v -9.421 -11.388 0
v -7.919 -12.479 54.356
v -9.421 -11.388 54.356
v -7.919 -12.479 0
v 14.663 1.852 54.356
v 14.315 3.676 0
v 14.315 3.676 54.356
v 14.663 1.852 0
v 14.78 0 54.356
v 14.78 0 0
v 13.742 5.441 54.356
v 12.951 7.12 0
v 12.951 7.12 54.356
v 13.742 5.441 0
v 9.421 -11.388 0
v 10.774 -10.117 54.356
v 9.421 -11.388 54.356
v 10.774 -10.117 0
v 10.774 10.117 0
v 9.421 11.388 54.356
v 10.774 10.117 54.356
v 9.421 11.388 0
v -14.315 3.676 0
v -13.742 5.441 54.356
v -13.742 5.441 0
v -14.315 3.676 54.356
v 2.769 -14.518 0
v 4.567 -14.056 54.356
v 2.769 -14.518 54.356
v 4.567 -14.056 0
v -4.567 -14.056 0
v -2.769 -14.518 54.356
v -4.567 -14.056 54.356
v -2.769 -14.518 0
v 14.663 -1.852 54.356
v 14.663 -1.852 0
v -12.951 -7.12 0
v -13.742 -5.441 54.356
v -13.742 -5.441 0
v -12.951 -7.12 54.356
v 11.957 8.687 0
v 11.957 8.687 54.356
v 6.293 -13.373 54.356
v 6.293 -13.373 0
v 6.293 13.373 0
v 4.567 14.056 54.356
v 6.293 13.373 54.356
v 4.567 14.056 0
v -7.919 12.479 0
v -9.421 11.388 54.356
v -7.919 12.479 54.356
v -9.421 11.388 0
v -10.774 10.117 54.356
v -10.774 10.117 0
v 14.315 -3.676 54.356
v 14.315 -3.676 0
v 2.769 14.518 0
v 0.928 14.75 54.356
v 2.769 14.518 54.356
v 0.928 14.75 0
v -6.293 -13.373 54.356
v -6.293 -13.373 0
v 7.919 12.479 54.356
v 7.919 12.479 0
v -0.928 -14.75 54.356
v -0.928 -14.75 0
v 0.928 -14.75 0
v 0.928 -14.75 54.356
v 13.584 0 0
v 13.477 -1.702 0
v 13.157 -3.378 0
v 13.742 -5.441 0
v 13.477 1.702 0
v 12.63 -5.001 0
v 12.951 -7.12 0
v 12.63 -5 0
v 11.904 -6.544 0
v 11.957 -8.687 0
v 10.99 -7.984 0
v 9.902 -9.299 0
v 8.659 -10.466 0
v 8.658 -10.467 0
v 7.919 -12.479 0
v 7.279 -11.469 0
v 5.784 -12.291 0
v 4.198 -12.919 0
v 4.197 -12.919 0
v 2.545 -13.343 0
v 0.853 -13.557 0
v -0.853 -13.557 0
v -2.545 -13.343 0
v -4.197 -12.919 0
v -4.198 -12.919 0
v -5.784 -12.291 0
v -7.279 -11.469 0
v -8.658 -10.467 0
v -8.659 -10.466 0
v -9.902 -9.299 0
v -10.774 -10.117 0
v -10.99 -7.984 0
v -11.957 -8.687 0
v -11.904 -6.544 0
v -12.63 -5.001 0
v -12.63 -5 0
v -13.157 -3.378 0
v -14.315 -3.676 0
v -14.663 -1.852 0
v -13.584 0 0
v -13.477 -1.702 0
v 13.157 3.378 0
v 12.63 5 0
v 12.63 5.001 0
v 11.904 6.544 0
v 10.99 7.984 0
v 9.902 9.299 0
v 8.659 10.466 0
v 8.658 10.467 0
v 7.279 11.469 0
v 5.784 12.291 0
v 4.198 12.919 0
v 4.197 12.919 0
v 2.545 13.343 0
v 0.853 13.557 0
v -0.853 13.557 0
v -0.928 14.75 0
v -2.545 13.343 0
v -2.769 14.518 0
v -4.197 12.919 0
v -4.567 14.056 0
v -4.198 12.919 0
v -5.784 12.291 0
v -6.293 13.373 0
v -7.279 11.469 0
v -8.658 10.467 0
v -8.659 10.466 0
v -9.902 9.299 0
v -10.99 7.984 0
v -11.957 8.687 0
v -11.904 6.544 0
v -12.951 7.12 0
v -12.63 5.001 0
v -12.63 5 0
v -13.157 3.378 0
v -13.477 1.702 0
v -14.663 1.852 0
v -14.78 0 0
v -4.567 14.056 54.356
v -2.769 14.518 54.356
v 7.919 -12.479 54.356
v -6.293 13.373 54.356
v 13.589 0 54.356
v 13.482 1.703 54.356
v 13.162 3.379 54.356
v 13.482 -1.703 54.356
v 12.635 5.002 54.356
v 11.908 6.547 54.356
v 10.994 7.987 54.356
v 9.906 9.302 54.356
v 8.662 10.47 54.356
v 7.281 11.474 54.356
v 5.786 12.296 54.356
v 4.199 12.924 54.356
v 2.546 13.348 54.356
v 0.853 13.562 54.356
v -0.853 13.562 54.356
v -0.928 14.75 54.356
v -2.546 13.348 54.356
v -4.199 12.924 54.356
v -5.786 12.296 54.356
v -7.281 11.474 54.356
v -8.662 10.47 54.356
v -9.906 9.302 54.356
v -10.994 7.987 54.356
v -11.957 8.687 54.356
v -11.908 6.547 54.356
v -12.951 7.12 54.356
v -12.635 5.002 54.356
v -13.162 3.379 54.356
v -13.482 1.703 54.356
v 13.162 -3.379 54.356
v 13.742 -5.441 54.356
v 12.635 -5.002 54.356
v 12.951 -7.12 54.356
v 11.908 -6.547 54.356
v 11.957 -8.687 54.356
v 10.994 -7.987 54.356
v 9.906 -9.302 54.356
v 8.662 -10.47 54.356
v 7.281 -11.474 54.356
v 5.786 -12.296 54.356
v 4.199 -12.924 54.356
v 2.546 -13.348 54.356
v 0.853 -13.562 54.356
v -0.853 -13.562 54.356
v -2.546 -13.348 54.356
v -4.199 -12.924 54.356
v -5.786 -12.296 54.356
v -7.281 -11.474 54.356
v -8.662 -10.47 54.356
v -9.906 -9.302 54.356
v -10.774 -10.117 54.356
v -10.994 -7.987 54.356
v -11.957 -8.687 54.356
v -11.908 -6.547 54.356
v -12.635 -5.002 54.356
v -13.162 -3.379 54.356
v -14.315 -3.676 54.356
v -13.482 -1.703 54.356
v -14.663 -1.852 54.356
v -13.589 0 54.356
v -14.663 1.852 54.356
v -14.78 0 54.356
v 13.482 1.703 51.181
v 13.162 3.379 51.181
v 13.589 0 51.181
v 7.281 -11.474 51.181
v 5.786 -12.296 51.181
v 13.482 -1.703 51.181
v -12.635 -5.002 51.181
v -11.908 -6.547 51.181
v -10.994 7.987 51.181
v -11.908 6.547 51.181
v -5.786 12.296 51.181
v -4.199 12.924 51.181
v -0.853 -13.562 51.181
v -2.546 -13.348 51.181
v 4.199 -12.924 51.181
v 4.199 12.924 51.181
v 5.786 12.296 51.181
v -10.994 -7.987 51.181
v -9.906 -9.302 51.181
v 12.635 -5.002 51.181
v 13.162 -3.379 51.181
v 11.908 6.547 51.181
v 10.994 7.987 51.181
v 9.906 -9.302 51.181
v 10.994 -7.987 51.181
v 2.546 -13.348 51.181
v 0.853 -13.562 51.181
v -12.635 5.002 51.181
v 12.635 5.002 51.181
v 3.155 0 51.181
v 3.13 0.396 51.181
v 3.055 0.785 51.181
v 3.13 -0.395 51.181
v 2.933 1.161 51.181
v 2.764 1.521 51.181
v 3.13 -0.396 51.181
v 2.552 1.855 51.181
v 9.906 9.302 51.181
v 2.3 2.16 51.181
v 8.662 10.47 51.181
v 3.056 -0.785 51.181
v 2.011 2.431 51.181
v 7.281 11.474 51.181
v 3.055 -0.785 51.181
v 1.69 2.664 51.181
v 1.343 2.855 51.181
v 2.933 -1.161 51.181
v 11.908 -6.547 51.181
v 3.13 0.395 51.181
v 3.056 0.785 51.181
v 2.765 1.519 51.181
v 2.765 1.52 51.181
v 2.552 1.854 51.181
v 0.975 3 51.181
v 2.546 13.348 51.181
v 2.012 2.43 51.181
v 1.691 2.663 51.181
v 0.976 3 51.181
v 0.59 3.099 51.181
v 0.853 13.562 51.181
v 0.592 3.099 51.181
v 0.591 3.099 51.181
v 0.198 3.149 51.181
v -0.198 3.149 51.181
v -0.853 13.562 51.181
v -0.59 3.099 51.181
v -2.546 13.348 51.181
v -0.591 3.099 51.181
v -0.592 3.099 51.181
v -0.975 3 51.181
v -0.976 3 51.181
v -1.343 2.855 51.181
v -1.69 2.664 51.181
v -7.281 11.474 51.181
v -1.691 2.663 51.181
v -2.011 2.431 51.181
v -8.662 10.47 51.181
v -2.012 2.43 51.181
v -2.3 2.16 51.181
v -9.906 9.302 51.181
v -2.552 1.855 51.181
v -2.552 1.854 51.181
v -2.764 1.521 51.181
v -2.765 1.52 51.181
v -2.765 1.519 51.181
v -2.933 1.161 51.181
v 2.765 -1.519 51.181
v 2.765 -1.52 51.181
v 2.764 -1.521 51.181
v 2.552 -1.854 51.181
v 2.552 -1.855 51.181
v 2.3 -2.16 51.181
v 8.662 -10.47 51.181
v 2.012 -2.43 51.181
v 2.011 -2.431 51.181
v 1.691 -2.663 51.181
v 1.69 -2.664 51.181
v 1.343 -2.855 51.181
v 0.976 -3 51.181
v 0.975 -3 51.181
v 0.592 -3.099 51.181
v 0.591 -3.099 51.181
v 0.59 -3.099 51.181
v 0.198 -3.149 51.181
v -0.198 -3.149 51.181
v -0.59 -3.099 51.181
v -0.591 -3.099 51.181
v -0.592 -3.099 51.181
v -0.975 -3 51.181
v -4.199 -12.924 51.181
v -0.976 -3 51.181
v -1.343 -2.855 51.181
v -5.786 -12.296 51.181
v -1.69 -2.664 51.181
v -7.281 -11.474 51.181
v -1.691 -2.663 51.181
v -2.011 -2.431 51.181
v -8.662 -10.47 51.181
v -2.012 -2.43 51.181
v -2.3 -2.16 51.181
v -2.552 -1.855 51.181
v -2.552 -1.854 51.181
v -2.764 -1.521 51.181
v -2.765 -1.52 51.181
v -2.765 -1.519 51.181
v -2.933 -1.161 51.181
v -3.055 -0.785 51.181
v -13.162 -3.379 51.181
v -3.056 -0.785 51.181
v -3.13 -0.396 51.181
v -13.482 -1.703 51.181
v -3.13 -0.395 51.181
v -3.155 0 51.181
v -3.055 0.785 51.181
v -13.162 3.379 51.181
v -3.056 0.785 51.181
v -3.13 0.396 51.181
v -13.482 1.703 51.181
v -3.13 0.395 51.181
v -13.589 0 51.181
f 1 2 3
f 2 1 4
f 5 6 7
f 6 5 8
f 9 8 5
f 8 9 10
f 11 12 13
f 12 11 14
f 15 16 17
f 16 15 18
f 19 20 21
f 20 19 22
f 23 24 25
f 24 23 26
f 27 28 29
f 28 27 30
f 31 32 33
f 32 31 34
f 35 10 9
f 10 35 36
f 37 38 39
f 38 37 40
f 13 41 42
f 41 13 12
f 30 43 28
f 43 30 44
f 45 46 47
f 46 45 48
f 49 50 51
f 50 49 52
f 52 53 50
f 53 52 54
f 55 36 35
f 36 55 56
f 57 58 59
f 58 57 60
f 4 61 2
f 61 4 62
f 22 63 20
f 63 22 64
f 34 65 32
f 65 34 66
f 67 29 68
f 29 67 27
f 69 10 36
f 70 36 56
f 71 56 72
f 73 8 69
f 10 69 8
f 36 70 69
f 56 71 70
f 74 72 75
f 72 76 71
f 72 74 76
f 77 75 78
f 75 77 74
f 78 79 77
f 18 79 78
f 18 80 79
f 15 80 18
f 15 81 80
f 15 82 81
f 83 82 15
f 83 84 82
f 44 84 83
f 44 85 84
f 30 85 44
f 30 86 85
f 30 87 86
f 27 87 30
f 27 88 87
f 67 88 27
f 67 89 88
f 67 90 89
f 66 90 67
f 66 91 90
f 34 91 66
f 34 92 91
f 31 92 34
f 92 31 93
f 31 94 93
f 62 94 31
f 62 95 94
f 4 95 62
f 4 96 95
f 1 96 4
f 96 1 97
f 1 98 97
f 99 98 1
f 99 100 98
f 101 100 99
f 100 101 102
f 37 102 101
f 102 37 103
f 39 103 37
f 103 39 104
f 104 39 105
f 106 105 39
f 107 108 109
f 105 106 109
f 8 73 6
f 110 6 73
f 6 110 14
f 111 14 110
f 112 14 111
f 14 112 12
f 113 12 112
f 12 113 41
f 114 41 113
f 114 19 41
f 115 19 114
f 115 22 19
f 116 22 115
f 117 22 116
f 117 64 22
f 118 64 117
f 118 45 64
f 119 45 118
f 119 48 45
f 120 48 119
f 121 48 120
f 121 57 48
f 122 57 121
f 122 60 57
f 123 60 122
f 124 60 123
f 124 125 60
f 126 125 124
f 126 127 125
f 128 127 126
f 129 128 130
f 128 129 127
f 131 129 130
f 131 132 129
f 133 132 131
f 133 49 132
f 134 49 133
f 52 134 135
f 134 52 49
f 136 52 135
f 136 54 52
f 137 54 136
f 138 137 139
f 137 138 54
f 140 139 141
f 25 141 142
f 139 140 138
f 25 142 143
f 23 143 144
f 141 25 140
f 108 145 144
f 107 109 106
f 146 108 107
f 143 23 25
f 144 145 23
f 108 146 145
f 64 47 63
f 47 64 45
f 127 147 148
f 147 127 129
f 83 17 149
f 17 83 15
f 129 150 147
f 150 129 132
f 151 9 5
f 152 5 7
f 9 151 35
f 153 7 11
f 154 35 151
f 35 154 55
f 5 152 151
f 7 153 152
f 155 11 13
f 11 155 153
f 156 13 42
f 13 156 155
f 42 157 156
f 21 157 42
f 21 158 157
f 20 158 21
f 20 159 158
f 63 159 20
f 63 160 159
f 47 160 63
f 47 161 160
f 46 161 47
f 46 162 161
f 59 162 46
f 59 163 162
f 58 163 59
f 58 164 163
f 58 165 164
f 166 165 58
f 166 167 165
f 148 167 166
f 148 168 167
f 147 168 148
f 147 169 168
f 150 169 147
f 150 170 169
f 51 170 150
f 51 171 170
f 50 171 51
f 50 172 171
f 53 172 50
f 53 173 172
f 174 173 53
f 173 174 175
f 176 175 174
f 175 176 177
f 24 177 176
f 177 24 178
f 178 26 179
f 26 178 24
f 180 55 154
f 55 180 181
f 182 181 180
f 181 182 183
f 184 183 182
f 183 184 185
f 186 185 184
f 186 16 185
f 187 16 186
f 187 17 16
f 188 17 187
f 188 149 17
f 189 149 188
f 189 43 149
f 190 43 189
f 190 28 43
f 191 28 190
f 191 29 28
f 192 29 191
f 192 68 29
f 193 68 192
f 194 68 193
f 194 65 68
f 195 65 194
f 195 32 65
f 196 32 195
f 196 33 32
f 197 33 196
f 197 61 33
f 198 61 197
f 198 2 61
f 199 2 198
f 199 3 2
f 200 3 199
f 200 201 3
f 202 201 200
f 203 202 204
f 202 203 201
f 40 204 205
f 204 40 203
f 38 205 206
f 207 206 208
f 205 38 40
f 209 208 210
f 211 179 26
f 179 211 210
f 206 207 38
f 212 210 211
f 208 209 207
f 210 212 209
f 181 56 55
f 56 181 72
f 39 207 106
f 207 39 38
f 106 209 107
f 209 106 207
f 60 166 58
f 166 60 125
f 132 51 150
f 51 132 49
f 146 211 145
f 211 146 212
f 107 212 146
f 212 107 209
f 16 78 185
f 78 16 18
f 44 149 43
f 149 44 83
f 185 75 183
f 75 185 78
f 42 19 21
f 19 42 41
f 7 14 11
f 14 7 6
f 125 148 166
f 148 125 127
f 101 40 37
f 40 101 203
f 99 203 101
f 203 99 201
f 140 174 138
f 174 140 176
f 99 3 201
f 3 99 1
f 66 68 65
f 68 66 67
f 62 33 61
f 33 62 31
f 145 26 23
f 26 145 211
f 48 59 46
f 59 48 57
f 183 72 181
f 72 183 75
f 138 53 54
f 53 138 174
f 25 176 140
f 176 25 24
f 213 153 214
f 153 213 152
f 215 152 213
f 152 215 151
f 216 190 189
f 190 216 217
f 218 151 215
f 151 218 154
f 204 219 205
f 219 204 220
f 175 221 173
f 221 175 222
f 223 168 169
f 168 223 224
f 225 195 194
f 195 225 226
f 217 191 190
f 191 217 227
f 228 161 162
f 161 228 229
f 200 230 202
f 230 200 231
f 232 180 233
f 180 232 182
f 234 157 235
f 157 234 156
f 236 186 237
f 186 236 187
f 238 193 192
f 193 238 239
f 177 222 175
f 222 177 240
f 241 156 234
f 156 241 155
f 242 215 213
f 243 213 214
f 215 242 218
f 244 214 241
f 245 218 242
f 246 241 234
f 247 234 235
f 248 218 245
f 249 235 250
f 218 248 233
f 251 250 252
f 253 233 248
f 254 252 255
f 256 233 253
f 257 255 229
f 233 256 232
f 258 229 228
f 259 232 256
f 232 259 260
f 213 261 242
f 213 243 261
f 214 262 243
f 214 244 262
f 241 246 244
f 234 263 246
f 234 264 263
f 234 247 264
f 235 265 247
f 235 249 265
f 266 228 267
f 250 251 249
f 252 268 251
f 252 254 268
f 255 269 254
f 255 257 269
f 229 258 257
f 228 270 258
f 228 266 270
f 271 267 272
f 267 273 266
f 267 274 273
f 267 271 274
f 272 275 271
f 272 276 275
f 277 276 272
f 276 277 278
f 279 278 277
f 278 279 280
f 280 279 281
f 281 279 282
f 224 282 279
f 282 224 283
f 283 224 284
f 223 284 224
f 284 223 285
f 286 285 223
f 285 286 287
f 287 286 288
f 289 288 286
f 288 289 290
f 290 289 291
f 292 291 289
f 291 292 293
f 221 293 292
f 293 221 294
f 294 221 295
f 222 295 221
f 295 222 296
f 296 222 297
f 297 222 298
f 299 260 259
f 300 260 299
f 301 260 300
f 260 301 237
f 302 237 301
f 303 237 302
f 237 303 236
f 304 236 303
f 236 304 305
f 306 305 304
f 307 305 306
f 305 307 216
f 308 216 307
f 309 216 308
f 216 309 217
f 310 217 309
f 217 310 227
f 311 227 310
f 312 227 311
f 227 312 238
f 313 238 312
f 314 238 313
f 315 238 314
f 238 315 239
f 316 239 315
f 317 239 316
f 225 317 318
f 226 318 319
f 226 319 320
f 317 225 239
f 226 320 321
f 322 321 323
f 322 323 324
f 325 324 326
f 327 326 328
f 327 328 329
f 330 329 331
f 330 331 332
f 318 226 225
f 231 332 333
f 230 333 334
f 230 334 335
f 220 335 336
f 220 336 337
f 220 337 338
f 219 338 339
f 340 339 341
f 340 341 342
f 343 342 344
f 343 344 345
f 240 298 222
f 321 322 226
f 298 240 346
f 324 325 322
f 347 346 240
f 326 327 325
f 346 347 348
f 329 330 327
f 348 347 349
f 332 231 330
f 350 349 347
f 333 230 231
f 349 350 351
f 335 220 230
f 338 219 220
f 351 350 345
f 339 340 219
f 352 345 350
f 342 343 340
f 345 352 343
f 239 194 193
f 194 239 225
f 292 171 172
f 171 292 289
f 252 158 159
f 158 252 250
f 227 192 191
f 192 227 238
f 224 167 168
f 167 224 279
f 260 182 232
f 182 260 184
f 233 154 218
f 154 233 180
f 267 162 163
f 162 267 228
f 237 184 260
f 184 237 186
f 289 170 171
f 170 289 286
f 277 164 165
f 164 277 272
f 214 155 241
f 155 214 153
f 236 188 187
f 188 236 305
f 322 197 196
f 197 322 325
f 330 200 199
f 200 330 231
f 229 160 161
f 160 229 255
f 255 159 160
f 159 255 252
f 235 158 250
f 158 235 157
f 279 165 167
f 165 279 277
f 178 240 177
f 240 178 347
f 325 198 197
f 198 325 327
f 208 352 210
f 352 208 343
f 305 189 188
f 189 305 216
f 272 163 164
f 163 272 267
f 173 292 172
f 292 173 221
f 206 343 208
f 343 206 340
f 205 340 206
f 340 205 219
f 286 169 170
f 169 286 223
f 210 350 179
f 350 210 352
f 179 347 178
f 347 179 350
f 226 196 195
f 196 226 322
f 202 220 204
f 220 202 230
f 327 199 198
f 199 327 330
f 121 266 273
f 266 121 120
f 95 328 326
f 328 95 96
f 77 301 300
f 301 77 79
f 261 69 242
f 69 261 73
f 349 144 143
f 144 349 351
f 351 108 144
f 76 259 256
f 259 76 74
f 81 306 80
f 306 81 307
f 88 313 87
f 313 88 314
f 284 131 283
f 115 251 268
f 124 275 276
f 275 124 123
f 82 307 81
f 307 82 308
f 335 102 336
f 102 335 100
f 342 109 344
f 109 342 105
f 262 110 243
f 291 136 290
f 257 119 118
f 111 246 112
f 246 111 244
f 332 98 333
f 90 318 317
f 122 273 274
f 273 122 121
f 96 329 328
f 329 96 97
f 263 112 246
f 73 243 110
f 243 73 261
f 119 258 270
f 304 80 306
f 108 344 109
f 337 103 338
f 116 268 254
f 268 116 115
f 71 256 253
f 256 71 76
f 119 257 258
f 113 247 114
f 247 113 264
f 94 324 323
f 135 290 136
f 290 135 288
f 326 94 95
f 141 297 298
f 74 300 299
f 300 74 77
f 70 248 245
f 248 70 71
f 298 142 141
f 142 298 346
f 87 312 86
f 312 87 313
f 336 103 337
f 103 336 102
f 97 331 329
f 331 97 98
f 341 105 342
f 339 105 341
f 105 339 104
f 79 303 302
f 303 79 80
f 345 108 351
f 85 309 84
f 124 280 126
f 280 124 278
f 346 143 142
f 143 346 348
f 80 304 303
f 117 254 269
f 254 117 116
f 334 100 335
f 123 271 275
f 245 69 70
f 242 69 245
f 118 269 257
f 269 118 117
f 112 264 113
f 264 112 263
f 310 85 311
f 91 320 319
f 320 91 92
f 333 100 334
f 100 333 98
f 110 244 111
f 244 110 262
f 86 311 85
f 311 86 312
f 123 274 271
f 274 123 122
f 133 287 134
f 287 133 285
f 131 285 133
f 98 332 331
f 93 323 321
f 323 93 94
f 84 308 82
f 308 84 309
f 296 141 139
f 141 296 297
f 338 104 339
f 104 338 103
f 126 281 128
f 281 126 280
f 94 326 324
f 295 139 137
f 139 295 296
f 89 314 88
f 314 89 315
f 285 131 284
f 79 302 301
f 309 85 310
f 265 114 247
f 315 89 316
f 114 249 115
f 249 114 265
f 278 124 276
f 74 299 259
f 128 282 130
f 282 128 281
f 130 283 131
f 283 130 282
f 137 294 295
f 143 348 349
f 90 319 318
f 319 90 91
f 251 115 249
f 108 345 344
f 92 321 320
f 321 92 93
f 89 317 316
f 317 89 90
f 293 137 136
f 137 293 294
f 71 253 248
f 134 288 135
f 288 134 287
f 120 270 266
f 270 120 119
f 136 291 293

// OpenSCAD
// file: ../Ammo/Primer.scad
//
// Primer dimensions
//

PrimerRimDiameter   = 1; // Diameter of the rim
PrimerRimHeight     = 2; // Height of the rim
PrimerHeight        = 3; // Total height of the primer
PrimerMajorDiameter = 4; // Measured just above the rim of the primer
PrimerMinorDiameter = 5; // Measured near the tip of the primer
PrimerClearance     = 6; // Extra clearance for fitting
PrimerFn            = 7; // Sides, for rendering


// Produces no primer
PrimerDummy = [
  [PrimerRimDiameter,   0],
  [PrimerRimHeight,     0],
  [PrimerHeight,        0],
  [PrimerMajorDiameter, 0],
  [PrimerMinorDiameter, 0],
  [PrimerClearance,     0],
  [PrimerFn,            0]
];

// .209 type (based on Fiocchi 616)
Primer209 = [
  [PrimerRimDiameter,   0.309],
  [PrimerRimHeight,     0.01],
  [PrimerHeight,        0.3],
  [PrimerMajorDiameter, 0.248],
  [PrimerMinorDiameter, 0.242],
  [PrimerClearance,     0.021],
  [PrimerFn,            12]
];

// .22 cal "Powder Actuated Tool" aka. Ramset
Primer22PAT = [
  [PrimerRimDiameter,   0.309],
  [PrimerRimHeight,     0.039],
  [PrimerHeight,        0.28],
  [PrimerMajorDiameter, 0.226],
  [PrimerMinorDiameter, 0.226],
  [PrimerClearance,     0.021],
  [PrimerFn,            12]
];

// 12 gram CO2 cartridge mouth and neck
Primer12gCO2 = [
  [PrimerRimDiameter,   0.315],
  [PrimerRimHeight,     0.24],
  [PrimerHeight,        0.29],
  [PrimerMajorDiameter, 0.315],
  [PrimerMinorDiameter, 0.76],
  [PrimerClearance,     0],
  [PrimerFn,            12]
];

function PrimerOAHeight(primer=undef) = lookup(PrimerHeight, primer) + lookup(PrimerRimHeight, primer);

module Primer(primer=Primer209, extend=0.001) {
  render()
  union() {

    // Rim
    translate([0,0,-extend])
    cylinder(r=(lookup(PrimerRimDiameter, primer)+lookup(PrimerClearance, primer))/2,
      h=lookup(PrimerRimHeight, primer) + extend,
      $fn=lookup(PrimerFn, primer));

    // Rim Taper
    translate([0,0,lookup(PrimerRimHeight, primer)])
    cylinder(r1=(lookup(PrimerRimDiameter, primer)+lookup(PrimerClearance, primer))/2,
      r2=(lookup(PrimerMajorDiameter, primer)+lookup(PrimerClearance, primer))/2,
      h=lookup(PrimerRimHeight, primer),
      $fn=lookup(PrimerFn, primer));

    // Primer
    translate([0,0,lookup(PrimerRimHeight, primer)])
    cylinder(r1=(lookup(PrimerMajorDiameter, primer) + lookup(PrimerClearance, primer))/2,
             r2=(lookup(PrimerMinorDiameter, primer) + lookup(PrimerClearance, primer))/2,
             h=lookup(PrimerHeight, primer) + 0.1,
             $fn=lookup(PrimerFn, primer));
  }
}

// scale([25.4, 25.4, 25.4]) Primer();
// main file
include <../Vitamins/Pipe.scad>;
include <../Ammo/Primer.scad>;

module PowderFunnel(socketDiameter=lookup(PipeOuterDiameter, PipeThreeQuarterInch),
                    socketDepth=1/8,
                    primer=Primer209,
                    wall=3/64,
                    $fn=50) {
  height = socketDiameter * 2;
                      
  difference() {
    
    // Funnel Body
    cylinder(r=(socketDiameter/2) + wall, h=height);
    
    translate([0,0,height - socketDepth]) {
      
      // Socket
      cylinder(r=socketDiameter/2, h=socketDepth + 0.1);
    }
          
    // Funnel
    translate([0,0,-0.001])
    cylinder(r1=socketDiameter/2,
             r2=lookup(PrimerMajorDiameter, primer)/2,
             h=height - socketDepth + 0.002);
  }
}

scale([25.4, 25.4, 25.4]) PowderFunnel();
